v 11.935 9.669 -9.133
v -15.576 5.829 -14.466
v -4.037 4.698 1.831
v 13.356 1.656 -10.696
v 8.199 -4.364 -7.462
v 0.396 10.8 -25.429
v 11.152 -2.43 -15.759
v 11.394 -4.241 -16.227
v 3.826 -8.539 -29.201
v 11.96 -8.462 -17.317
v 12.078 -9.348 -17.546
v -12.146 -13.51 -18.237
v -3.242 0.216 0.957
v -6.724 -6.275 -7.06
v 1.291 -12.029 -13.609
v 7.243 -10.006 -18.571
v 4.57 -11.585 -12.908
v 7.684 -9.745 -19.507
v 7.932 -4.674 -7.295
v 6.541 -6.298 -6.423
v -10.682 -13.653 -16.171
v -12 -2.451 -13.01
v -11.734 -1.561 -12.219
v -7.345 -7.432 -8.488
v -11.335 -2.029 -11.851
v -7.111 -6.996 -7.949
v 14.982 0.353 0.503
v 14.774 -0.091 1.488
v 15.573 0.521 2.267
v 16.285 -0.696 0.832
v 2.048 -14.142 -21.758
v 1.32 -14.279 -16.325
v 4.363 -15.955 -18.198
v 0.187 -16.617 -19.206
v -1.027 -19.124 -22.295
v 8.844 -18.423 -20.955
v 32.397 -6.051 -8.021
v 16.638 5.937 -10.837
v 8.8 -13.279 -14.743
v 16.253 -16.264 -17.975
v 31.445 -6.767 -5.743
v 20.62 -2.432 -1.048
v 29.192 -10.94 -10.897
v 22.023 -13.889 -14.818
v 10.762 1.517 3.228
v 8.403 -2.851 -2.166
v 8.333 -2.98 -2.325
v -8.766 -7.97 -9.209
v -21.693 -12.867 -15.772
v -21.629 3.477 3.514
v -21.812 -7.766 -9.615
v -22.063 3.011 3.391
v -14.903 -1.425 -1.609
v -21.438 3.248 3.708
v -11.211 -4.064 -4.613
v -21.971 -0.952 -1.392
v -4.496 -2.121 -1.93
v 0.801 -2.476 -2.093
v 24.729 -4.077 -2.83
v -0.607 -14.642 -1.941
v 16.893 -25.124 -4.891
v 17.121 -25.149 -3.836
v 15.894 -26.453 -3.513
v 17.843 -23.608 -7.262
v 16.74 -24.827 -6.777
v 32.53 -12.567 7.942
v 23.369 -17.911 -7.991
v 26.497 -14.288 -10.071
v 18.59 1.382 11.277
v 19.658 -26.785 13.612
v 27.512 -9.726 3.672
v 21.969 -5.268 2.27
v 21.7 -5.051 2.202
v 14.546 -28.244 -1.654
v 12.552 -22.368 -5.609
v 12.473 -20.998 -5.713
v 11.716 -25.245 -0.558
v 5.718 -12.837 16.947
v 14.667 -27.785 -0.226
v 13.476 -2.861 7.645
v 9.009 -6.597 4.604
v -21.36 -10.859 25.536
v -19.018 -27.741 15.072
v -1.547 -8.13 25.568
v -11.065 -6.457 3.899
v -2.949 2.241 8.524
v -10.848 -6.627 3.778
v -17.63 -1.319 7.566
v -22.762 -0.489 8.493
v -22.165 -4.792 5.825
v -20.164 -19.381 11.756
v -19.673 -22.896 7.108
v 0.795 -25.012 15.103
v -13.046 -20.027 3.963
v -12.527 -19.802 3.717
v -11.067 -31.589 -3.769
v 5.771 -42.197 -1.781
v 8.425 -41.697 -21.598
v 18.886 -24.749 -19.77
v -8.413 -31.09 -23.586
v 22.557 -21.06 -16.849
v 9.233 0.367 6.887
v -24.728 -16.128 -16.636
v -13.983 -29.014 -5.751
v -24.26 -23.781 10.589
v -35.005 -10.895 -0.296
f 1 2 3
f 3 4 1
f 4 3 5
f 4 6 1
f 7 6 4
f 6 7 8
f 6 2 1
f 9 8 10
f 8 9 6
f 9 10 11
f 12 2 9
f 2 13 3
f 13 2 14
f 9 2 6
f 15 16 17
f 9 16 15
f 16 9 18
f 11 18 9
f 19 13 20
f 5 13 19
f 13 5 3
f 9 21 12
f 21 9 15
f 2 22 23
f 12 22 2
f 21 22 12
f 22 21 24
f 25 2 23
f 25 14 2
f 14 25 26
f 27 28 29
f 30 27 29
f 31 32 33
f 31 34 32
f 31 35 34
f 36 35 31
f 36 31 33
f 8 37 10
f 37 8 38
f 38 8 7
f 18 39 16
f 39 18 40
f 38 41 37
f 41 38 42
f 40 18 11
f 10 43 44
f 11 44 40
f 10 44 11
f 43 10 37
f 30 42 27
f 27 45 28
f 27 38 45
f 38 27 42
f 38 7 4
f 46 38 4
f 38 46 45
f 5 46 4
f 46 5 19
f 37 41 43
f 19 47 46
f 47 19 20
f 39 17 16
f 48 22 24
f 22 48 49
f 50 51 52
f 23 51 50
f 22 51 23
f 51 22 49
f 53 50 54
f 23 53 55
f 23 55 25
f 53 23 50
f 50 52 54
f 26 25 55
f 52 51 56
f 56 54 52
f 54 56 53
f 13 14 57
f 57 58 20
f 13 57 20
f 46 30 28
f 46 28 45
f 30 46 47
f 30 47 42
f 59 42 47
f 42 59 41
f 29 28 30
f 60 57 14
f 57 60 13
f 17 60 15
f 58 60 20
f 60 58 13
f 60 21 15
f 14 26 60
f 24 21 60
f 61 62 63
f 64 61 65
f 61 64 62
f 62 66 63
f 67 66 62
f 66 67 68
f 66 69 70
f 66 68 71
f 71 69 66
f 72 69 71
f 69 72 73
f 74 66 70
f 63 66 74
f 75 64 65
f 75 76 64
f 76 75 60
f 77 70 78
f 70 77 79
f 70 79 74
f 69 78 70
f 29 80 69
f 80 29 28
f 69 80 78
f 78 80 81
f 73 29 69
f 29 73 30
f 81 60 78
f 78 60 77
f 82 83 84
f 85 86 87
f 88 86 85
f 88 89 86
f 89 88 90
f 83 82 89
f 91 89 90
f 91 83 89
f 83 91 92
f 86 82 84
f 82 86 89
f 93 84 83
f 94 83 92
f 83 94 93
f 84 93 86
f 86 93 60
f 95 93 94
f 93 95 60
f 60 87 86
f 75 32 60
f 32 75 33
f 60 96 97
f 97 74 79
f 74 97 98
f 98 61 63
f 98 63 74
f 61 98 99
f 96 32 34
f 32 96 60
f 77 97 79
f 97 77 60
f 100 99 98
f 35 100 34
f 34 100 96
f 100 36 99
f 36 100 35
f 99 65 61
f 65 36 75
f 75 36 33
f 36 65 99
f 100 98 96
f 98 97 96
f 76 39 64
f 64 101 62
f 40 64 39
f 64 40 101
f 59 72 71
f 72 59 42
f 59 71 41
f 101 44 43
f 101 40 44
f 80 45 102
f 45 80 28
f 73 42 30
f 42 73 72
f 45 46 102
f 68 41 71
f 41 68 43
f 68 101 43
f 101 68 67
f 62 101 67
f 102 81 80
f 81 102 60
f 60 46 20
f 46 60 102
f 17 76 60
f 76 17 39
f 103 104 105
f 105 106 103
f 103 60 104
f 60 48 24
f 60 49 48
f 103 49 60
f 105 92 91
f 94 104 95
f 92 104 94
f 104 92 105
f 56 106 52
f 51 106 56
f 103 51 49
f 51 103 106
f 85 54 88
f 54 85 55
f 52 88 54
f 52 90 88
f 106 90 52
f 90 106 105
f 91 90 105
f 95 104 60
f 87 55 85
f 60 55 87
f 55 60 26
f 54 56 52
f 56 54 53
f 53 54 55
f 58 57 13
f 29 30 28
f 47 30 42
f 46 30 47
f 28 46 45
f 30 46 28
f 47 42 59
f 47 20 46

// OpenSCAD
seed=rands(0,100,100 ) ;
 n= rands(-1,1,3,seed[0]);
o=rands(-10,10,3,seed[1]);
echo(n,o);
 union()planeSlice(  60,n,o ) 
translate([0,0,10])union() {
    for (t = [0: 5]) {
        r = rands(0, 360, 3 ,seed[t]);
       c = rands(0, 1, 3,seed[t]);
     color(c)   rotate(r) cube(20);
    }
}
*
color("red")  translate(o){
  sphere(1);
 hull(){
  sphere(.5);
translate( n*20) sphere(.5);
}
look_at(n)square(20,true);}

module crop(maxh = 100) {
    intersection() {
        color() {
            children();
        }
        linear_extrude(maxh)
        hull()
        projection() {
            children();
        }
    }
}
module planeSlice(maxh = 100,normal,origin)

{union(){
  color("red")    planeCrop(maxh ,normal,origin)  children();
  color("green")  planeCrop(maxh ,-normal,origin)  children();
    
    }
    }
 module planeCrop(maxh = 100,normal,origin) {
     if(normal==[0,0,1]) // flat z normal special case
         {mirror([0,0,1]) 
           translate(-origin)
              crop(maxh)    
                 translate(origin)
                    color() {
                      mirror([0,0,1])  children();
                    }
             }
     else 
         {
     
  translate(origin)
  look_at(-normal )
         crop(maxh)    
             look_at(-normal)
               translate(-origin)
                    color() {
                        children();
                    }
               }
           }


module look_at(lookpoint,origin=[0,0,0],rotatefrom=[0,0,1]){
rotations=look_at(lookpoint,origin ,rotatefrom);
rotate(rotations[0],rotations[1]) children();
}
function look_at(p,o=[0,0,0],up=[0,0,1])=let(a=up,b=p-o,c=cross(a,b) ,d=angle(a,b))[d,c];

function angle (a,b)=atan2(sqrt((cross(a, b)*cross(a, b))), (a* b));


module constructionPlane(normal=[0,0,1],origin=[0,0,0]){
    look_at(normal ,origin ){  children();
    if($preview){%linear_extrude(10e-16)square($vpd*.5,true);}        
    
        }
        }
